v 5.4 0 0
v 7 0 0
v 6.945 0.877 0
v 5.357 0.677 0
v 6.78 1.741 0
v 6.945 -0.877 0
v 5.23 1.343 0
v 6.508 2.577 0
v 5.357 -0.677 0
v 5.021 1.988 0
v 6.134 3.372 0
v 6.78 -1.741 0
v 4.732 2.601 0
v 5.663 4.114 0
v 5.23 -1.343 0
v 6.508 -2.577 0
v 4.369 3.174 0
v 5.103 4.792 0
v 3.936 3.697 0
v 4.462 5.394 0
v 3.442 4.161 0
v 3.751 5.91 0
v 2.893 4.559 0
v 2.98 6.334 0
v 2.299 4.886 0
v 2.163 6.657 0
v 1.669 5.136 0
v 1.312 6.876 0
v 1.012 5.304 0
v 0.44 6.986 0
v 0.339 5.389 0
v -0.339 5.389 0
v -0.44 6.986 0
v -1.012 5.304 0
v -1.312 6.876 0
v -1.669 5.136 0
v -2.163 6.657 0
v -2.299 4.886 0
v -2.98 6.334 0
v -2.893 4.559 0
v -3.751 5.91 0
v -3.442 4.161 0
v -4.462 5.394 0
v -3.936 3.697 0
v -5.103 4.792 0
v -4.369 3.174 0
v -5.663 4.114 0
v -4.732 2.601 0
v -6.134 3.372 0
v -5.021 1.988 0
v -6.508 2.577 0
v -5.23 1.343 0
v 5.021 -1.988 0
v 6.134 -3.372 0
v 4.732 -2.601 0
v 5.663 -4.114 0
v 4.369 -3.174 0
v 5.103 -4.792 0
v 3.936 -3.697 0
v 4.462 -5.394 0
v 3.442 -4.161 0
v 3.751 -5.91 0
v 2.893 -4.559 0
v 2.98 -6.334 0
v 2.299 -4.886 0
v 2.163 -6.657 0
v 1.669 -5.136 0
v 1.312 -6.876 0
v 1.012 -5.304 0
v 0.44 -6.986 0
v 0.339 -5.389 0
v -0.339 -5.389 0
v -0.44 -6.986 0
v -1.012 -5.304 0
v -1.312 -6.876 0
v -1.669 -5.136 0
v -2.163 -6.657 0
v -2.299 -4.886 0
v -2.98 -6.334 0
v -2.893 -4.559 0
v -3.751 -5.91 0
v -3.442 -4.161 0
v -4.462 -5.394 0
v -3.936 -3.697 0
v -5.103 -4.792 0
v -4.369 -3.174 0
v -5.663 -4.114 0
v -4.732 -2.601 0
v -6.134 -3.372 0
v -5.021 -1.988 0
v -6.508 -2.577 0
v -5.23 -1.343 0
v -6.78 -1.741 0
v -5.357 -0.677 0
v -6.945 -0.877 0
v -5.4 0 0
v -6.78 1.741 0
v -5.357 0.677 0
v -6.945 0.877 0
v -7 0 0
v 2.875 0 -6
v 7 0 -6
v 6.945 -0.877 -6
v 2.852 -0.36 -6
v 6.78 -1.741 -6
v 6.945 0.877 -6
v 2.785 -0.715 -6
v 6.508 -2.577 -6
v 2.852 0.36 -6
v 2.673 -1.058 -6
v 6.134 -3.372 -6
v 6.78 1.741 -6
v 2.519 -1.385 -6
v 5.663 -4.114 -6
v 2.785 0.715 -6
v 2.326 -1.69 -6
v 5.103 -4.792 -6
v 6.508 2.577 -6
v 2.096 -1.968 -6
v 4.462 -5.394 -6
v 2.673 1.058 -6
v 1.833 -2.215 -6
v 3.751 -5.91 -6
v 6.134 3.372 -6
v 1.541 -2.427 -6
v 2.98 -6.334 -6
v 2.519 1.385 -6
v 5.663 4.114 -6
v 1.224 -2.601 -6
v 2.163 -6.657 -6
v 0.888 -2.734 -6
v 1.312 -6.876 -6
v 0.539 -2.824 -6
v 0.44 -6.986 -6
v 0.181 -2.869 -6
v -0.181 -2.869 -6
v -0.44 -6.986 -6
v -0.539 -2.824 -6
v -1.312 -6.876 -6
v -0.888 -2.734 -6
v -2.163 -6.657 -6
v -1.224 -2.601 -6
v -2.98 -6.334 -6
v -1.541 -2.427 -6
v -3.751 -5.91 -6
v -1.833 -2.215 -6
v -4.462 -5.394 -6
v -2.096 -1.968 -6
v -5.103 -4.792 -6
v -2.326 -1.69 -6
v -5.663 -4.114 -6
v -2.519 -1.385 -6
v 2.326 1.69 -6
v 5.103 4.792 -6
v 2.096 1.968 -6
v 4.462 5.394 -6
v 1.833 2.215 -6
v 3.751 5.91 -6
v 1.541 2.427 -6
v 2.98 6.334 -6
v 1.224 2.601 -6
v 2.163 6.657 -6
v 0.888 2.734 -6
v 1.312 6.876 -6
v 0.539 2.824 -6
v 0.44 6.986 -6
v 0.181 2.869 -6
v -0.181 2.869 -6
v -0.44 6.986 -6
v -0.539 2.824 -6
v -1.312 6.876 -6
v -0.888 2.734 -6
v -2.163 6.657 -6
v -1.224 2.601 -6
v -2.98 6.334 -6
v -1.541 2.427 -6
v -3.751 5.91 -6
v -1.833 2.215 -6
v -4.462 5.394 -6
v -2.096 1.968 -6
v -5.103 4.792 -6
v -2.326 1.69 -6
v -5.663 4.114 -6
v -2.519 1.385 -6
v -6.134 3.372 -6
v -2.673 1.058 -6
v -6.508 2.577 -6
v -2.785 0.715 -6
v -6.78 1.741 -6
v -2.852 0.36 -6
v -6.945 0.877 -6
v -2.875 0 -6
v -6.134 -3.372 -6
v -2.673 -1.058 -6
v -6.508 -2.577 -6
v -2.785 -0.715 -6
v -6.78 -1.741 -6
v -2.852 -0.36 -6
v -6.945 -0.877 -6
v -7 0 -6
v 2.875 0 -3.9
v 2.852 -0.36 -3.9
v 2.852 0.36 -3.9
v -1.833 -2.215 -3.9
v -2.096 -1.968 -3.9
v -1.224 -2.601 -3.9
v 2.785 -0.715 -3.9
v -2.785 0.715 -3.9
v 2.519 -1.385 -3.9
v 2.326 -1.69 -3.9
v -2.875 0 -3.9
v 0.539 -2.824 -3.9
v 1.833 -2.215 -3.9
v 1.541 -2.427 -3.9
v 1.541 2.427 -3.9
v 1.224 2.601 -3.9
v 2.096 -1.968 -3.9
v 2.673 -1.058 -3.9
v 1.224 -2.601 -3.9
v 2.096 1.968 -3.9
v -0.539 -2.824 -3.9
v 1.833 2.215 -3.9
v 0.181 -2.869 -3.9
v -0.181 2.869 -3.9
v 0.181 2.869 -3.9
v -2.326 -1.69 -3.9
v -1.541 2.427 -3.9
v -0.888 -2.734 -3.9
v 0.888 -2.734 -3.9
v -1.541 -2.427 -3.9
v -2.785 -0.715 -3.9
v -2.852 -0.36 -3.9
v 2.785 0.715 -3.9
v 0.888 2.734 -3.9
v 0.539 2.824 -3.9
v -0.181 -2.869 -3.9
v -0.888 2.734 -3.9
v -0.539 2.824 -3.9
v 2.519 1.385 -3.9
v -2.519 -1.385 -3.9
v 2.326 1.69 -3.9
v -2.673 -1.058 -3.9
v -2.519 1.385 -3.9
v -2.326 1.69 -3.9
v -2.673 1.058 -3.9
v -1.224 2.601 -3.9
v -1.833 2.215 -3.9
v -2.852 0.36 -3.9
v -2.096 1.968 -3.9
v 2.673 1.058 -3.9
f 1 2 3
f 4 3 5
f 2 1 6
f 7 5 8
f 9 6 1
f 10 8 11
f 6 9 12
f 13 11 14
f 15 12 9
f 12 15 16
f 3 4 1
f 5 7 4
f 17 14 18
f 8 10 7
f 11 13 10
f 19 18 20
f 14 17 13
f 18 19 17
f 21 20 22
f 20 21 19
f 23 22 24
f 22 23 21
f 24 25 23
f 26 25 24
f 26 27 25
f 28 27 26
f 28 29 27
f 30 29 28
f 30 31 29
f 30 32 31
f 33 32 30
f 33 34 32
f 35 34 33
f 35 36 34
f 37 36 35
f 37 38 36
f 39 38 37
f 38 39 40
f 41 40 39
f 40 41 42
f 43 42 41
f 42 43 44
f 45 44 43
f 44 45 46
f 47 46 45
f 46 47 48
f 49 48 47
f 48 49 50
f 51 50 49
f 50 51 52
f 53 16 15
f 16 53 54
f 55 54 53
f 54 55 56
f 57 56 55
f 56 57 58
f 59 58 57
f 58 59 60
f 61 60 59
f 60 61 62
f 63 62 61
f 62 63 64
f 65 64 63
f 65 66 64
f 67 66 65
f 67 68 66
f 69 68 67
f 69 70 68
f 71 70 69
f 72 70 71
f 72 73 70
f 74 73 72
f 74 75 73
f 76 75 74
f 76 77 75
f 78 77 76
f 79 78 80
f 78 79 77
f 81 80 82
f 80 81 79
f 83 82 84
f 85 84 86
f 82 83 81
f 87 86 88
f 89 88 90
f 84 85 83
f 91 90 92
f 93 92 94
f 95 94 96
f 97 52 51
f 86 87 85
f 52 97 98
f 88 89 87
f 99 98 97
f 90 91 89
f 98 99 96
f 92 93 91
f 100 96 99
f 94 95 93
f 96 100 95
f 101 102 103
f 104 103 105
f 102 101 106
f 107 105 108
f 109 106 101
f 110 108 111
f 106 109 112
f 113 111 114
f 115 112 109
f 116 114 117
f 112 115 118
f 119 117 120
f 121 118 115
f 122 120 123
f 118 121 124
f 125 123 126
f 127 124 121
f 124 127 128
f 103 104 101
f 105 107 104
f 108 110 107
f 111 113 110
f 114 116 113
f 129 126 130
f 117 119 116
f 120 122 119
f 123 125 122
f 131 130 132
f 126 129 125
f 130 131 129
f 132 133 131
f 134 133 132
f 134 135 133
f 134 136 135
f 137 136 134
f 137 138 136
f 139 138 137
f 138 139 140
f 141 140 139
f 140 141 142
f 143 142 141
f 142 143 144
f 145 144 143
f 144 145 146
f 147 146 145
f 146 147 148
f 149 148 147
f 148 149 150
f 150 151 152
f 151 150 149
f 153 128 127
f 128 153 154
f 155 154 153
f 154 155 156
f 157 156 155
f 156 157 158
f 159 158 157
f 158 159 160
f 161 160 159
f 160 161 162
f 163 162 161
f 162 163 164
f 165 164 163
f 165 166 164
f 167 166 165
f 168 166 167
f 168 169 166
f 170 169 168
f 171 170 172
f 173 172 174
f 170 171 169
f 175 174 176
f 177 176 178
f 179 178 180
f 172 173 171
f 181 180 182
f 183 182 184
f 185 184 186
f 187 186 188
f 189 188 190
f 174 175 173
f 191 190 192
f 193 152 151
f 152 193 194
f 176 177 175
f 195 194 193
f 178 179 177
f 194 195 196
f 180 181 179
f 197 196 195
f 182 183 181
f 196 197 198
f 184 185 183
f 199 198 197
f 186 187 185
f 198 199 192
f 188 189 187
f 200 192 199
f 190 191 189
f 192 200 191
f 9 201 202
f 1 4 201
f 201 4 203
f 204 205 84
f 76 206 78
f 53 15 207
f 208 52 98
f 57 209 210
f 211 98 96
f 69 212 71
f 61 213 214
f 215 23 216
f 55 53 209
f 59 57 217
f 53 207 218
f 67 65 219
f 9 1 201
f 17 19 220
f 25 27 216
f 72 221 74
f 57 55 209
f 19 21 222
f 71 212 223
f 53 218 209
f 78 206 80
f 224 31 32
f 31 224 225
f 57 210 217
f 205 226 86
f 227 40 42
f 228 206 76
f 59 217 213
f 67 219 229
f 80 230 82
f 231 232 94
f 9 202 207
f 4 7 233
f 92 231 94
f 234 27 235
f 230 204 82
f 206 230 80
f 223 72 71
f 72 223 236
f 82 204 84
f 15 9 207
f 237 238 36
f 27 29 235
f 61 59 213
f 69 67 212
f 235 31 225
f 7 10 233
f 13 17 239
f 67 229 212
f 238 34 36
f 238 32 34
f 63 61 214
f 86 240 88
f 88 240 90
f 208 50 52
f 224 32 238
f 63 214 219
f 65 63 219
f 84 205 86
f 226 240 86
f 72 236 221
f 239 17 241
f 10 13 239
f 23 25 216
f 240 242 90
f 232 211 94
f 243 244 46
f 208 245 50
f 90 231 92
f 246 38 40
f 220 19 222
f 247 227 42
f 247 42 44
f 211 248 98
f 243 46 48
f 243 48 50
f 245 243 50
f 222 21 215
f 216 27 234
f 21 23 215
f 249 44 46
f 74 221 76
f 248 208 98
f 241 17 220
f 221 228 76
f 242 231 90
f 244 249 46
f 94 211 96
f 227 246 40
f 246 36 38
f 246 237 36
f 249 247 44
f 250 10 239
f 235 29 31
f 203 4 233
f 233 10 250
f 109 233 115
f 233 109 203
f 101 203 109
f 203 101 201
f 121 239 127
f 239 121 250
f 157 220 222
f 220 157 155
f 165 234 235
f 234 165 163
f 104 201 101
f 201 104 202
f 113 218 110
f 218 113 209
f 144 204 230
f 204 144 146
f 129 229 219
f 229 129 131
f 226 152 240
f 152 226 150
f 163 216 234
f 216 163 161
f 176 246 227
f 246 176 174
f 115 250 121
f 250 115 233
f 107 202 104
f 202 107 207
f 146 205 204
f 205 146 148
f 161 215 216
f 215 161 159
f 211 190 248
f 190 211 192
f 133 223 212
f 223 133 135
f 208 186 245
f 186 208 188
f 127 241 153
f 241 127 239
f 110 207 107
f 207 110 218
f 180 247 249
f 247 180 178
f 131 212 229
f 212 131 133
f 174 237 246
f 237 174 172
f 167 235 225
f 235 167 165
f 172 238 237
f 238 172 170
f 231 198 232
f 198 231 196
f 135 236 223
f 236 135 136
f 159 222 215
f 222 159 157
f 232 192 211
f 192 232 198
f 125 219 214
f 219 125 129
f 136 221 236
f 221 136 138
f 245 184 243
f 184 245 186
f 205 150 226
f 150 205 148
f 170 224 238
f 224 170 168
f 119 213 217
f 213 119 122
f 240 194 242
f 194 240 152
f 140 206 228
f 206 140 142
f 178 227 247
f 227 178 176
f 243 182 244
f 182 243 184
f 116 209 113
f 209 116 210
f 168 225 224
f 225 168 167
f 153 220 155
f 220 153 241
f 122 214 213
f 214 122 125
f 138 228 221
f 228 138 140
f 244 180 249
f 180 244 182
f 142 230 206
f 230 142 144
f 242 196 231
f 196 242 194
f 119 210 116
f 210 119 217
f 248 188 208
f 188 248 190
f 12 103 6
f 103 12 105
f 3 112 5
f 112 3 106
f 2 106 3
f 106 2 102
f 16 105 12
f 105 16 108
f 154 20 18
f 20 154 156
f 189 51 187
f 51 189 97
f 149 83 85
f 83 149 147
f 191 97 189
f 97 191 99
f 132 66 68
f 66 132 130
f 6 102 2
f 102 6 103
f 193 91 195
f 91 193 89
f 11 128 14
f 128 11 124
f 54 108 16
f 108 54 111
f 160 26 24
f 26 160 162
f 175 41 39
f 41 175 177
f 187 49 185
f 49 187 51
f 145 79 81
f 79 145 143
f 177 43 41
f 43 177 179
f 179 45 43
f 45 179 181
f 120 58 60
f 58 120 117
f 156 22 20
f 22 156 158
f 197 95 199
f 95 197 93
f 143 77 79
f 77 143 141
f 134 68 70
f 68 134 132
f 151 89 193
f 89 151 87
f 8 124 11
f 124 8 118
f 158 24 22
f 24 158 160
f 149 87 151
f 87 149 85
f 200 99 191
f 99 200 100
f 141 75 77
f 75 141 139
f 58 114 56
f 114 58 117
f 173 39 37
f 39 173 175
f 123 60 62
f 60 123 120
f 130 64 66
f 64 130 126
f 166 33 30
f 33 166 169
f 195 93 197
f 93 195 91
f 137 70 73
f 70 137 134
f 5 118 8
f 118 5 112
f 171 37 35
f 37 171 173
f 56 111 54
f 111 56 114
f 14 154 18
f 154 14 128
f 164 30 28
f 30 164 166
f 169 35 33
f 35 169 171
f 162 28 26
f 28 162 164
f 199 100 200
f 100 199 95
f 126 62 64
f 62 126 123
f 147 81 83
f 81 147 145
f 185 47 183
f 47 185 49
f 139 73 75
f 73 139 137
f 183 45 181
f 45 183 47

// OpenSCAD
$fn = 50;


difference() {
	union() {
		translate(v = [0, 0, -6.0000000000]) {
			cylinder(h = 6, r = 7.0000000000);
		}
		cylinder(h = 0, r = 10.0000000000);
	}
	union() {
		translate(v = [0, 0, 0]) {
			rotate(a = [0, 0, 0]) {
				difference() {
					union() {
						#translate(v = [0, 0, -6.0000000000]) {
							cylinder(h = 6, r = 2.6000000000);
						}
						#translate(v = [0, 0, -3.9000000000]) {
							cylinder(h = 3.9000000000, r = 7.0000000000, r1 = 2.8750000000, r2 = 5.4000000000);
						}
						#translate(v = [0, 0, -6.0000000000]) {
							cylinder(h = 6, r = 2.8750000000);
						}
						#translate(v = [0, 0, -6.0000000000]) {
							cylinder(h = 6, r = 2.6000000000);
						}
					}
					union();
				}
			}
		}
	}
}
